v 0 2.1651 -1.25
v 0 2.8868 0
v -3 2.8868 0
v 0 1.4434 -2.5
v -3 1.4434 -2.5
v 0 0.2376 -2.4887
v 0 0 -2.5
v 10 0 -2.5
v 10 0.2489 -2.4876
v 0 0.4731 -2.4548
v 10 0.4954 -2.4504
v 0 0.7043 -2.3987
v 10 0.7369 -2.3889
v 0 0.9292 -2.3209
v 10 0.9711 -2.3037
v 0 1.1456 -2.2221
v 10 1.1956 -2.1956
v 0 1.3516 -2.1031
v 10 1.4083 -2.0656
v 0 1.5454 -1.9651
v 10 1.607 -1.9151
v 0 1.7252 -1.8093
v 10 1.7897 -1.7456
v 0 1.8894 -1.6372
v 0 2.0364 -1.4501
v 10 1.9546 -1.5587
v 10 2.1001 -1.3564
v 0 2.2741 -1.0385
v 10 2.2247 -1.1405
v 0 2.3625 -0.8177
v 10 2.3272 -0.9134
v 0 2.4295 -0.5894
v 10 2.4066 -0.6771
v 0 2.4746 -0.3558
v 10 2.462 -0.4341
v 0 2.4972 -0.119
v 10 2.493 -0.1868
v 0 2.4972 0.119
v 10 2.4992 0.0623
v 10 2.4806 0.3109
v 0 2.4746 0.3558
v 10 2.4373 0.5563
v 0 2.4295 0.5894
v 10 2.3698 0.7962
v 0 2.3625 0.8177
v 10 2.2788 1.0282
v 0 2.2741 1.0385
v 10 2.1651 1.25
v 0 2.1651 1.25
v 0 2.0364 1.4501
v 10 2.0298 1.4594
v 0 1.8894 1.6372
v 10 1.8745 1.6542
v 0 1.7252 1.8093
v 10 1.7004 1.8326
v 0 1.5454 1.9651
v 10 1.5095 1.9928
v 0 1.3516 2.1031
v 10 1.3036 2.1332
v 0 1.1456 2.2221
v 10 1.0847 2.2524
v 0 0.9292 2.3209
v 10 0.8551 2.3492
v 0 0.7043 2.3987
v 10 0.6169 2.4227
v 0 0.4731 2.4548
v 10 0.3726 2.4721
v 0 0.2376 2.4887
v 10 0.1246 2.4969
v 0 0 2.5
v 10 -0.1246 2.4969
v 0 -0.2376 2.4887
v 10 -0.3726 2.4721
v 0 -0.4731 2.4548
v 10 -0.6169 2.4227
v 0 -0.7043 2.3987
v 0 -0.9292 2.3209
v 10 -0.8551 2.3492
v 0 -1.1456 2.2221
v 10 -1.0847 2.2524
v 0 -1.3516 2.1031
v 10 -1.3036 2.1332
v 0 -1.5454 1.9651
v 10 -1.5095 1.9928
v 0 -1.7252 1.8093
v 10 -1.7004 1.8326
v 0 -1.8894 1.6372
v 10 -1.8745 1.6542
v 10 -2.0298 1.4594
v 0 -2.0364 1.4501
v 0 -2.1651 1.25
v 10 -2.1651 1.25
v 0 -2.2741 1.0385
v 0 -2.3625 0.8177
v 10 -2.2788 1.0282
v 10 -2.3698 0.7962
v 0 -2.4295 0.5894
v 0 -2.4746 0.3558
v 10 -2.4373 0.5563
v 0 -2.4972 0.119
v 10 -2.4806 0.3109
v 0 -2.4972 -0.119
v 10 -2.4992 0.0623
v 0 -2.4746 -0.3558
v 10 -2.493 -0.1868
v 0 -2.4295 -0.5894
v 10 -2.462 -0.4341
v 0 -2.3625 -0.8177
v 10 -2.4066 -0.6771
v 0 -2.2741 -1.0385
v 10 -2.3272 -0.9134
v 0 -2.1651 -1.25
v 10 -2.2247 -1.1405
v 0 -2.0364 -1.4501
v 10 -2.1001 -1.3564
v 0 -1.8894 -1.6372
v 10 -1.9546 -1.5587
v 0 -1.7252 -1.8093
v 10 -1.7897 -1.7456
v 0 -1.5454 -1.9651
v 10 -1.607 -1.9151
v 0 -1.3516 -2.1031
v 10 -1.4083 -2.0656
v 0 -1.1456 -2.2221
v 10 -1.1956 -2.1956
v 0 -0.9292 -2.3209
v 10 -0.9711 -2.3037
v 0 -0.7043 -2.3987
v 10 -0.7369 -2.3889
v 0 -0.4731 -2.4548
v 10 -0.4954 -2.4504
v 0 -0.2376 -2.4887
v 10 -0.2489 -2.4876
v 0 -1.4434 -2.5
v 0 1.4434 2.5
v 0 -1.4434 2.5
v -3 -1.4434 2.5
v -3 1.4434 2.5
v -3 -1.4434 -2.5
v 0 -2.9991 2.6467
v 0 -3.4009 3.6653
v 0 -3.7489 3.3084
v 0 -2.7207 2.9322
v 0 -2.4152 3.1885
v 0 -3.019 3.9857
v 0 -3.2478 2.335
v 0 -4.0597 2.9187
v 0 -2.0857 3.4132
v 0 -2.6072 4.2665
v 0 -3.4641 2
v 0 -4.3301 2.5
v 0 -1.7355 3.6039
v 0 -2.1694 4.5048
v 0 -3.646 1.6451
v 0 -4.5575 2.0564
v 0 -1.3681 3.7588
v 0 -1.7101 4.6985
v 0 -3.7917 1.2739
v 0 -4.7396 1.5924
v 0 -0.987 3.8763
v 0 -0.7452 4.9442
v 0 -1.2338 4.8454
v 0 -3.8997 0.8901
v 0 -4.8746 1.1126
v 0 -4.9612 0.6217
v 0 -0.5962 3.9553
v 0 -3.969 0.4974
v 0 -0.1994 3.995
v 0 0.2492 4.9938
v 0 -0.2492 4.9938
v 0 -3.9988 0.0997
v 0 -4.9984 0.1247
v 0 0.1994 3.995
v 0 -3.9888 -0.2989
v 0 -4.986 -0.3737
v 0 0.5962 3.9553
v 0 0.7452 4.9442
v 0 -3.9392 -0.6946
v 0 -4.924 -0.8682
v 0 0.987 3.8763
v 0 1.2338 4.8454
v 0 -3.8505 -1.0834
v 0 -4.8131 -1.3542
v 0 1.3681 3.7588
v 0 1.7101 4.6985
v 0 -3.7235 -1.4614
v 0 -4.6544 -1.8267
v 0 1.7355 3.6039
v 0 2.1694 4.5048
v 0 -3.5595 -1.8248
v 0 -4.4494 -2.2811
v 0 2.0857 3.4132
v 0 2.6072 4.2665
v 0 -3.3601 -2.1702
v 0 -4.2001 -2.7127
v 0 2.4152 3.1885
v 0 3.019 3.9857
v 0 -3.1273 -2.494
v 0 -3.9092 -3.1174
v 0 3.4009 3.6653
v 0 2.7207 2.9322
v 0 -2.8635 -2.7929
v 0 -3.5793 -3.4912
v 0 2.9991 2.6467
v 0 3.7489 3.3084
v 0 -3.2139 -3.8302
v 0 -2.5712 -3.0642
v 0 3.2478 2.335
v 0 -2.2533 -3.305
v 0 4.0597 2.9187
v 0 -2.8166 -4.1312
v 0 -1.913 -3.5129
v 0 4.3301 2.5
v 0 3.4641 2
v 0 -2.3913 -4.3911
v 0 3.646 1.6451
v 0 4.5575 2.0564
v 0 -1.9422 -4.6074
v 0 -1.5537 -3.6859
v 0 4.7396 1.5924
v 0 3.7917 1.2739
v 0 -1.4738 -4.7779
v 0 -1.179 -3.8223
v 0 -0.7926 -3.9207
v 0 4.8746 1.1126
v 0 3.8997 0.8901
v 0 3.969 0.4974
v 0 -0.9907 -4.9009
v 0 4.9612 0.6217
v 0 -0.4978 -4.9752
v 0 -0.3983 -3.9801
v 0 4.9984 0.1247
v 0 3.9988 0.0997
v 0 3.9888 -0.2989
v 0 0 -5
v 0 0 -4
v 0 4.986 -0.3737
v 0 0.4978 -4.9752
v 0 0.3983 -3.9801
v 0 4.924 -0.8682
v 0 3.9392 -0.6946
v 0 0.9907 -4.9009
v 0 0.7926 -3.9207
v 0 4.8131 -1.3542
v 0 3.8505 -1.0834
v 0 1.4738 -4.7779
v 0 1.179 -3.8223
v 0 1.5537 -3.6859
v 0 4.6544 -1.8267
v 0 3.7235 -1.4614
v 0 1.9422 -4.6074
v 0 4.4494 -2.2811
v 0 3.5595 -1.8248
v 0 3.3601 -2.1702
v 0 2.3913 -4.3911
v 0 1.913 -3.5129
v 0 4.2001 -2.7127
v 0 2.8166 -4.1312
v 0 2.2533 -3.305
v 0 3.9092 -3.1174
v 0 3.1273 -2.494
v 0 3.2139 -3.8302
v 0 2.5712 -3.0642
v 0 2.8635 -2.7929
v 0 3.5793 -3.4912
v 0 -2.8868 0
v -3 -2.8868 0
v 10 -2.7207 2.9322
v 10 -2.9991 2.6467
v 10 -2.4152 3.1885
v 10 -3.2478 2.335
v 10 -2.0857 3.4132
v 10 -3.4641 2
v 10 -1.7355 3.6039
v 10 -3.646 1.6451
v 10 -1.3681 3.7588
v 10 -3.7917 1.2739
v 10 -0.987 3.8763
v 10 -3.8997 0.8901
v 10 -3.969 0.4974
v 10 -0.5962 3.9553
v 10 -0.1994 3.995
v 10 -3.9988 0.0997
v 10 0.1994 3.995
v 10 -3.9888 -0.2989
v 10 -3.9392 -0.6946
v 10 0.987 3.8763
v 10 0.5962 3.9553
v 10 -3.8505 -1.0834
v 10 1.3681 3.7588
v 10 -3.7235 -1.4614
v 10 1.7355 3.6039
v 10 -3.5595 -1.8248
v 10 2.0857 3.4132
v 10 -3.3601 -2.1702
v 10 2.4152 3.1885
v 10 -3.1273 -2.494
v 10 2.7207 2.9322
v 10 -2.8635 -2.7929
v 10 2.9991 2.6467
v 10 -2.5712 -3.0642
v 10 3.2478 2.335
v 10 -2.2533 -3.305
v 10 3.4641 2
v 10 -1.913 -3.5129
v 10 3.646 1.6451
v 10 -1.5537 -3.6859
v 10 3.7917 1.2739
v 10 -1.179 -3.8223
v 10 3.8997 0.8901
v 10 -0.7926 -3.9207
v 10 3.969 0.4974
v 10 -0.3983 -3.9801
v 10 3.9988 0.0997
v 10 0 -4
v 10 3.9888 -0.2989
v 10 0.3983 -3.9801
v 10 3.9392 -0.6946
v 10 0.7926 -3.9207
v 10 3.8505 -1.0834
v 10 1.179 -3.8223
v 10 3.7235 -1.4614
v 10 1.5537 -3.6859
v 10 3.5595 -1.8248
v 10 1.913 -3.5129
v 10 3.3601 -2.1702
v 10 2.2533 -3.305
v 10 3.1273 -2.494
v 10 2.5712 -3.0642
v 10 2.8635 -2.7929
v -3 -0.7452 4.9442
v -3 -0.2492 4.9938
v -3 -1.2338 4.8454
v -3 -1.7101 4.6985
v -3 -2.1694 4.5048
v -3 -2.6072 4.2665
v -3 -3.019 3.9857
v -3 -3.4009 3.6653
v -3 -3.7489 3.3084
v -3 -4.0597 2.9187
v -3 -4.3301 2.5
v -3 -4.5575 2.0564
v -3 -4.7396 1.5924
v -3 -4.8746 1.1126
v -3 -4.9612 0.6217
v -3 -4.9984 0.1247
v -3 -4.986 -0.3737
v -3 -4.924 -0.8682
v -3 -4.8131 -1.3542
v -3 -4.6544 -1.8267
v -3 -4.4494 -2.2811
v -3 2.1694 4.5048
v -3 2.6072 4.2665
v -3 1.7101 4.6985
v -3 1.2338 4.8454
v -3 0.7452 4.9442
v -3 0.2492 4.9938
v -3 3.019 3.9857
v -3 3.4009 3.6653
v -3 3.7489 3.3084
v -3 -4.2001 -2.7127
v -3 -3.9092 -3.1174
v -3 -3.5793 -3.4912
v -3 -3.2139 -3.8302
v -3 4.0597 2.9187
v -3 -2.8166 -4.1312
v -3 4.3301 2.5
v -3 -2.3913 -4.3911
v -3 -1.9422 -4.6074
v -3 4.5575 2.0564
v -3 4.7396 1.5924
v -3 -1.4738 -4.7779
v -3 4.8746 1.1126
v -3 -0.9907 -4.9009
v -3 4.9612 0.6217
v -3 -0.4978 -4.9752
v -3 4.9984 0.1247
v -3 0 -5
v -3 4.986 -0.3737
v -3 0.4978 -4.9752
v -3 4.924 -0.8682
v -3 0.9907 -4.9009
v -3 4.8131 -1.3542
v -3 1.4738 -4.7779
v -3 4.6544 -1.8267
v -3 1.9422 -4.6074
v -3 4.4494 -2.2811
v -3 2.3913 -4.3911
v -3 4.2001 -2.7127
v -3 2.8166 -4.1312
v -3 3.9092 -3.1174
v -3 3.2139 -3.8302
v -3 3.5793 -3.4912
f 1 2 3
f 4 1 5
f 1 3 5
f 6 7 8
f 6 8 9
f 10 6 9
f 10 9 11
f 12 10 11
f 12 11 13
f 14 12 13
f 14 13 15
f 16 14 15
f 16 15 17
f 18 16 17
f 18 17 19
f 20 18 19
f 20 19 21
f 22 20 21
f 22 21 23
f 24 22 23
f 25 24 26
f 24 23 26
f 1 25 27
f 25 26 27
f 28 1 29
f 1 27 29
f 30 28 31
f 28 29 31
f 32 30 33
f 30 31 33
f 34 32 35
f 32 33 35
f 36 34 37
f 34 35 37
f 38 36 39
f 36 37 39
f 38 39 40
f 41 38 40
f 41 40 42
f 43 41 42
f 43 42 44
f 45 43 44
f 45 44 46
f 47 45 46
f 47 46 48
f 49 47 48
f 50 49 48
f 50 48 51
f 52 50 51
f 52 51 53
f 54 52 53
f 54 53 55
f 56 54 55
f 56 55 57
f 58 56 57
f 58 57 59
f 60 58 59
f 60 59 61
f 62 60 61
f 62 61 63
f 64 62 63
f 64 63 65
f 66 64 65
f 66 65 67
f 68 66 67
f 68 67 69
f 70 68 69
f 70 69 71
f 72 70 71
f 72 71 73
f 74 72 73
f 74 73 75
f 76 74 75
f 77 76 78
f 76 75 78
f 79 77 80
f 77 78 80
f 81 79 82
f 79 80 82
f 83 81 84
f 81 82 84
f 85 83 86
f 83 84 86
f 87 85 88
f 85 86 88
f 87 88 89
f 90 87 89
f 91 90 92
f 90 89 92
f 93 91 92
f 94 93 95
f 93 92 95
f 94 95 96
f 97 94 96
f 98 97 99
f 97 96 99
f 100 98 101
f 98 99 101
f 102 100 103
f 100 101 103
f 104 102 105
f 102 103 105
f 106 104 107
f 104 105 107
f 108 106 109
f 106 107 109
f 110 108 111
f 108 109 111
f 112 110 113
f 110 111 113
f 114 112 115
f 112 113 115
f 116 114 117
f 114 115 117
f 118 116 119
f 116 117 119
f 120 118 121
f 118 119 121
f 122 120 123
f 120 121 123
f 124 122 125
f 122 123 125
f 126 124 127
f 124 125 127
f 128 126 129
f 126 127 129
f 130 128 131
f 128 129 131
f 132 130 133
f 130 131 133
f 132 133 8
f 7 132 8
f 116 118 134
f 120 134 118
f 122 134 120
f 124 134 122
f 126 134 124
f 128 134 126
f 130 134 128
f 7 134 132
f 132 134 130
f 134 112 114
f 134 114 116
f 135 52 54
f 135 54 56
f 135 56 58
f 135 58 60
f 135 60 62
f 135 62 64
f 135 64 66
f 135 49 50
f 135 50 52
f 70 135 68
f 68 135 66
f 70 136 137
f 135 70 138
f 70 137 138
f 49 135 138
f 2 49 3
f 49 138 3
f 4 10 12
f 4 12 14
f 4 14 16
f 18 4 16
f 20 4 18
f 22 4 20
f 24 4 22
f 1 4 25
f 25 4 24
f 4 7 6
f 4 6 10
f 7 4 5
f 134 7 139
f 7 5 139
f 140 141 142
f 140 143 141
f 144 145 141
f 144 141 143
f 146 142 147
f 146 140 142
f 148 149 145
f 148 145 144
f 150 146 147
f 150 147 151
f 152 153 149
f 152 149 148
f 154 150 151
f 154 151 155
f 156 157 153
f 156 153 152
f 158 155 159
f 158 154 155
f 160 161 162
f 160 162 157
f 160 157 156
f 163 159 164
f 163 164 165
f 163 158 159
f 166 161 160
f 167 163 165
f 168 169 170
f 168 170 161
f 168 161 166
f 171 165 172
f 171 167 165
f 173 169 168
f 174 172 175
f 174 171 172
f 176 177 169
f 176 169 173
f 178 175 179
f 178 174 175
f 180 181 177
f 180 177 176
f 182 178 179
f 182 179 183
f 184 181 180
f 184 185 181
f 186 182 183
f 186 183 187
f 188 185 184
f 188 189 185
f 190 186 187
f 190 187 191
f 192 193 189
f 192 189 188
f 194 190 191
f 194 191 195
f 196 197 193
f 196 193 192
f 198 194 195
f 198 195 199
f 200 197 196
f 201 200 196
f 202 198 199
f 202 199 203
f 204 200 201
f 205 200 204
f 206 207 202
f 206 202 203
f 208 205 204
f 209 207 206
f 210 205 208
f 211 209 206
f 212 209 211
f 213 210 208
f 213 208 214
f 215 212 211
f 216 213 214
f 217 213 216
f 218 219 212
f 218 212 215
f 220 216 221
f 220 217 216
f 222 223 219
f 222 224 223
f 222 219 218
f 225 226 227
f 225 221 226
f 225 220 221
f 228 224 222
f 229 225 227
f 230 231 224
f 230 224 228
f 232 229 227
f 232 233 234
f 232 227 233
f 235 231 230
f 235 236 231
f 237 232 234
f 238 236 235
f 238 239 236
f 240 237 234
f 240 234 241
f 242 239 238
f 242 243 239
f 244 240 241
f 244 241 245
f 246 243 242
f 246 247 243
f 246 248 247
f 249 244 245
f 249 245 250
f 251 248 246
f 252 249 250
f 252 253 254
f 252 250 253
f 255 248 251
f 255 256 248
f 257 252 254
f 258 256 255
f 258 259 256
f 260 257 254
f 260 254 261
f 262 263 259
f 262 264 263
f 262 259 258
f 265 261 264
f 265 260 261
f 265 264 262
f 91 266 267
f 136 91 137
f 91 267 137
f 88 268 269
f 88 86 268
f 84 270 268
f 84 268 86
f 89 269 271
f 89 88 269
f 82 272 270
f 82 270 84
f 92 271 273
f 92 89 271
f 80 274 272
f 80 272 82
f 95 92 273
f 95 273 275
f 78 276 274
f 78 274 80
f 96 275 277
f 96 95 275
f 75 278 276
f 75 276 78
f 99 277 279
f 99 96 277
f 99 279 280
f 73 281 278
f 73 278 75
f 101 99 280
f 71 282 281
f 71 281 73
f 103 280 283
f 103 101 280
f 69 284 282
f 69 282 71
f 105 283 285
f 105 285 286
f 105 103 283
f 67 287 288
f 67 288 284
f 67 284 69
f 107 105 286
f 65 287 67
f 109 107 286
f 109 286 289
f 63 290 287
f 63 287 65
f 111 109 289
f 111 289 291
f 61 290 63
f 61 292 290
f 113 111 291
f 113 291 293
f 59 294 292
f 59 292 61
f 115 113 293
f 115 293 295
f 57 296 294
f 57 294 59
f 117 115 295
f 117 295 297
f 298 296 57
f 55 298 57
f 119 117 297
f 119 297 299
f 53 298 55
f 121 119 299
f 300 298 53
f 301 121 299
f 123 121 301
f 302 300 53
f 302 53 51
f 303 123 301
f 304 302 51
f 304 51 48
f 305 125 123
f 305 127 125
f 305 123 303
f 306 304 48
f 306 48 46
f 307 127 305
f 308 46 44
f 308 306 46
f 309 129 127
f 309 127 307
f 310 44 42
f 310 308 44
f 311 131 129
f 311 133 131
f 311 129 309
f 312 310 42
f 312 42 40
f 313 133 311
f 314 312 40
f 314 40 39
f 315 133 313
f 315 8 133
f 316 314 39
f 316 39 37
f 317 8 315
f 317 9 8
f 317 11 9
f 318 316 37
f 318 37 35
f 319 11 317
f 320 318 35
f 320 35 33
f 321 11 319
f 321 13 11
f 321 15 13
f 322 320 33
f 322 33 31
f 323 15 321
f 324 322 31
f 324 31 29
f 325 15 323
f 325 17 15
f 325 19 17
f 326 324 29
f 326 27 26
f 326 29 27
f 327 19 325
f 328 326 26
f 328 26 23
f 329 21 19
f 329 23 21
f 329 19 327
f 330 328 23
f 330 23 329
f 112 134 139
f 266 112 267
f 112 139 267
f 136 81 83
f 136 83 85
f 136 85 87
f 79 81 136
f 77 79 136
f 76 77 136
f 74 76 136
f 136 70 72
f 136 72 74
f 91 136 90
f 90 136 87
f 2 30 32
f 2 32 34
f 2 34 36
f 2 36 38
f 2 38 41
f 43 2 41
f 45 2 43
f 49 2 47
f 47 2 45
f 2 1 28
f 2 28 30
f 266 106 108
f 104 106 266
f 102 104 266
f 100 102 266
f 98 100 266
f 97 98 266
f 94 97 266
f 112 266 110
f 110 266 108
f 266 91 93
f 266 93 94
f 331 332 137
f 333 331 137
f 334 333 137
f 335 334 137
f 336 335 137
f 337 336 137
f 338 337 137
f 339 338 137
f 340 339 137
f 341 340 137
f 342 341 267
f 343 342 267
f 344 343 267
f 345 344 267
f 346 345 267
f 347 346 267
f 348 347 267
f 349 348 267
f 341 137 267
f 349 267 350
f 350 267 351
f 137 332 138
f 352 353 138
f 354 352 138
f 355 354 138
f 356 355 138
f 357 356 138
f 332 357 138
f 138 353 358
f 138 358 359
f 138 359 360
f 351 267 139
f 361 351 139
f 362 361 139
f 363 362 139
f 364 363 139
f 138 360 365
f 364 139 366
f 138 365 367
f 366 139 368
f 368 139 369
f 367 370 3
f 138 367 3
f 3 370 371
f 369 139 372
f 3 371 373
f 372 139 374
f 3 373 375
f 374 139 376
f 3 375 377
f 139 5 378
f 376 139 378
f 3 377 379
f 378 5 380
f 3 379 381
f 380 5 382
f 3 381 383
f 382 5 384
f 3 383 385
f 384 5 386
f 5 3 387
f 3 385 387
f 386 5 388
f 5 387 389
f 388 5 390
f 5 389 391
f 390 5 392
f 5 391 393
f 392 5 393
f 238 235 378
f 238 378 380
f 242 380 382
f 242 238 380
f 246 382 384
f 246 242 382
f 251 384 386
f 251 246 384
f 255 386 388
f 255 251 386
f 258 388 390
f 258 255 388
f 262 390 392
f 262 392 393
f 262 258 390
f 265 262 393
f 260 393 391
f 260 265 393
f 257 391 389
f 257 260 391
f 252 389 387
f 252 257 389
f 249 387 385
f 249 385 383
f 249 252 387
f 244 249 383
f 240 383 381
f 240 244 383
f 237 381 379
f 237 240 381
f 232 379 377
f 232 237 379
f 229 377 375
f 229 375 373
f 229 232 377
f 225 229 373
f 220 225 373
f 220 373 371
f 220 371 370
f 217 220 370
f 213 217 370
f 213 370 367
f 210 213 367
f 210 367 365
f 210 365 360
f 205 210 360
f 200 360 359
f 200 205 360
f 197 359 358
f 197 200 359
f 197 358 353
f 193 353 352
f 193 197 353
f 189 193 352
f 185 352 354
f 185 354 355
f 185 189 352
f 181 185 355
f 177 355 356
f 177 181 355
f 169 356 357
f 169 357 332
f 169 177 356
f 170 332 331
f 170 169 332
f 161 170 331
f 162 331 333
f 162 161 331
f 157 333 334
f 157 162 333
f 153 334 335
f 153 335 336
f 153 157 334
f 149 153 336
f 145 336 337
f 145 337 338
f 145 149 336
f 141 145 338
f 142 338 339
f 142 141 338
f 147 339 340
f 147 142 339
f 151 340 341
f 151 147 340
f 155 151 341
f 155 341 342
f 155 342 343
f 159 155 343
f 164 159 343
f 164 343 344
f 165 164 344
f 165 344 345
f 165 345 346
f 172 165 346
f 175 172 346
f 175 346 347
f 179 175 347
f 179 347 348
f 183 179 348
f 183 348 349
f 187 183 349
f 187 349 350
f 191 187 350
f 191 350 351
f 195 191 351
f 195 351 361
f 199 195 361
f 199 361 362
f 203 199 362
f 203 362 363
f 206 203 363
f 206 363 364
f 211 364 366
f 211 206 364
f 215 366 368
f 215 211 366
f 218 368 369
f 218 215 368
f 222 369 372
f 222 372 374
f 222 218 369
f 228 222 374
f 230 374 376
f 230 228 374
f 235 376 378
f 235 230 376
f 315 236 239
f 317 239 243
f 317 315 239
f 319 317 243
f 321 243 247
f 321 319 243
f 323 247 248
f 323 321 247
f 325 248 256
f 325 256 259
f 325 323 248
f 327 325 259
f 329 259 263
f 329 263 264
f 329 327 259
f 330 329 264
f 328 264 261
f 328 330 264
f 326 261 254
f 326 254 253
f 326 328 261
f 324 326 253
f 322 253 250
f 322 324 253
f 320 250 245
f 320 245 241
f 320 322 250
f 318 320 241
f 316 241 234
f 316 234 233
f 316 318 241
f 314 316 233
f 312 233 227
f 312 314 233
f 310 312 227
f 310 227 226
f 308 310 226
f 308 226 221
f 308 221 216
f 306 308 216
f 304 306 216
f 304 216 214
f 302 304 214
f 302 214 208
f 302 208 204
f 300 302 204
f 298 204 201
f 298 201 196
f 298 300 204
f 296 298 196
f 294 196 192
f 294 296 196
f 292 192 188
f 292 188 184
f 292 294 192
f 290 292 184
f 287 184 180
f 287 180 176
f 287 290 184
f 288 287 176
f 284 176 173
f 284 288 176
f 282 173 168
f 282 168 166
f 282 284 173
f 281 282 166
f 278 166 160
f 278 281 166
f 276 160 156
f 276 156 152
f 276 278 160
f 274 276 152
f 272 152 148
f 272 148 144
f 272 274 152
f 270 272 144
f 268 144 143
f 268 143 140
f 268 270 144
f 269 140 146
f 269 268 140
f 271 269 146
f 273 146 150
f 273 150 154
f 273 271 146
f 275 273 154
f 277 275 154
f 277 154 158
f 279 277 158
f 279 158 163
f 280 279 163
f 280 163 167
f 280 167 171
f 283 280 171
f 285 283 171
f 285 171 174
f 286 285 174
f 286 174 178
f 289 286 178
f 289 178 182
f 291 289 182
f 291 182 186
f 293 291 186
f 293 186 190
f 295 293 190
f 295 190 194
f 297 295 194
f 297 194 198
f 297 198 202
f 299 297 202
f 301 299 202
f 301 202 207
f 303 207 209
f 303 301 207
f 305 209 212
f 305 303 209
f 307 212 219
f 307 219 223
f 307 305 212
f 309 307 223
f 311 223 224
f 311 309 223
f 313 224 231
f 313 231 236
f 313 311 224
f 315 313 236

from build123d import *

# Parameters (mm, degrees)
ESQUISSE1_R             = 4
EXTRUSION1_DEPTH        = 10
EXTRUSION1_DEPTH_BACK   = 3
ESQUISSE2_R             = 5
EXTRUSION2_DEPTH        = 3
ENL_V_MAT_EXTRU_1_DEPTH = 3
ESQUISSE4_R             = 2.5
ENL_V_MAT_EXTRU_2_DEPTH = 14


with BuildPart() as part:
    # Esquisse1 → Extrusion1 (new body, two sides)
    with BuildSketch(Plane(origin=(0, 0, 0), x_dir=(0, 0, -1), z_dir=(1, 0, 0))) as extrusion1_sk:
        Circle(ESQUISSE1_R)
    extrude(amount=EXTRUSION1_DEPTH)
    extrude(extrusion1_sk.sketch, amount=-EXTRUSION1_DEPTH_BACK)

    # Esquisse2 → Extrusion2 (add)
    with BuildSketch(Plane(origin=(0, 0, 0), x_dir=(0, 0, -1), z_dir=(1, 0, 0))):
        Circle(ESQUISSE2_R)
    extrude(amount=-EXTRUSION2_DEPTH)

    # Esquisse3 → Enlèv. mat.-Extru.1 (cut)
    with BuildSketch(Plane.ZY.offset(3)):
        Polygon((0, 2.886751346), (-2.5, 1.443375673), (-2.5, -1.443375673), (0, -2.886751346), (2.5, -1.443375673), (2.5, 1.443375673), align=None)
    extrude(amount=-ENL_V_MAT_EXTRU_1_DEPTH, mode=Mode.SUBTRACT)

    # Esquisse4 → Enlèv. mat.-Extru.2 (cut, through all)
    with BuildSketch(Plane(origin=(10, 0, 0), x_dir=(0, 0, -1), z_dir=(1, 0, 0))):
        Circle(ESQUISSE4_R)
    extrude(amount=-ENL_V_MAT_EXTRU_2_DEPTH, mode=Mode.SUBTRACT)


solid = part.part
